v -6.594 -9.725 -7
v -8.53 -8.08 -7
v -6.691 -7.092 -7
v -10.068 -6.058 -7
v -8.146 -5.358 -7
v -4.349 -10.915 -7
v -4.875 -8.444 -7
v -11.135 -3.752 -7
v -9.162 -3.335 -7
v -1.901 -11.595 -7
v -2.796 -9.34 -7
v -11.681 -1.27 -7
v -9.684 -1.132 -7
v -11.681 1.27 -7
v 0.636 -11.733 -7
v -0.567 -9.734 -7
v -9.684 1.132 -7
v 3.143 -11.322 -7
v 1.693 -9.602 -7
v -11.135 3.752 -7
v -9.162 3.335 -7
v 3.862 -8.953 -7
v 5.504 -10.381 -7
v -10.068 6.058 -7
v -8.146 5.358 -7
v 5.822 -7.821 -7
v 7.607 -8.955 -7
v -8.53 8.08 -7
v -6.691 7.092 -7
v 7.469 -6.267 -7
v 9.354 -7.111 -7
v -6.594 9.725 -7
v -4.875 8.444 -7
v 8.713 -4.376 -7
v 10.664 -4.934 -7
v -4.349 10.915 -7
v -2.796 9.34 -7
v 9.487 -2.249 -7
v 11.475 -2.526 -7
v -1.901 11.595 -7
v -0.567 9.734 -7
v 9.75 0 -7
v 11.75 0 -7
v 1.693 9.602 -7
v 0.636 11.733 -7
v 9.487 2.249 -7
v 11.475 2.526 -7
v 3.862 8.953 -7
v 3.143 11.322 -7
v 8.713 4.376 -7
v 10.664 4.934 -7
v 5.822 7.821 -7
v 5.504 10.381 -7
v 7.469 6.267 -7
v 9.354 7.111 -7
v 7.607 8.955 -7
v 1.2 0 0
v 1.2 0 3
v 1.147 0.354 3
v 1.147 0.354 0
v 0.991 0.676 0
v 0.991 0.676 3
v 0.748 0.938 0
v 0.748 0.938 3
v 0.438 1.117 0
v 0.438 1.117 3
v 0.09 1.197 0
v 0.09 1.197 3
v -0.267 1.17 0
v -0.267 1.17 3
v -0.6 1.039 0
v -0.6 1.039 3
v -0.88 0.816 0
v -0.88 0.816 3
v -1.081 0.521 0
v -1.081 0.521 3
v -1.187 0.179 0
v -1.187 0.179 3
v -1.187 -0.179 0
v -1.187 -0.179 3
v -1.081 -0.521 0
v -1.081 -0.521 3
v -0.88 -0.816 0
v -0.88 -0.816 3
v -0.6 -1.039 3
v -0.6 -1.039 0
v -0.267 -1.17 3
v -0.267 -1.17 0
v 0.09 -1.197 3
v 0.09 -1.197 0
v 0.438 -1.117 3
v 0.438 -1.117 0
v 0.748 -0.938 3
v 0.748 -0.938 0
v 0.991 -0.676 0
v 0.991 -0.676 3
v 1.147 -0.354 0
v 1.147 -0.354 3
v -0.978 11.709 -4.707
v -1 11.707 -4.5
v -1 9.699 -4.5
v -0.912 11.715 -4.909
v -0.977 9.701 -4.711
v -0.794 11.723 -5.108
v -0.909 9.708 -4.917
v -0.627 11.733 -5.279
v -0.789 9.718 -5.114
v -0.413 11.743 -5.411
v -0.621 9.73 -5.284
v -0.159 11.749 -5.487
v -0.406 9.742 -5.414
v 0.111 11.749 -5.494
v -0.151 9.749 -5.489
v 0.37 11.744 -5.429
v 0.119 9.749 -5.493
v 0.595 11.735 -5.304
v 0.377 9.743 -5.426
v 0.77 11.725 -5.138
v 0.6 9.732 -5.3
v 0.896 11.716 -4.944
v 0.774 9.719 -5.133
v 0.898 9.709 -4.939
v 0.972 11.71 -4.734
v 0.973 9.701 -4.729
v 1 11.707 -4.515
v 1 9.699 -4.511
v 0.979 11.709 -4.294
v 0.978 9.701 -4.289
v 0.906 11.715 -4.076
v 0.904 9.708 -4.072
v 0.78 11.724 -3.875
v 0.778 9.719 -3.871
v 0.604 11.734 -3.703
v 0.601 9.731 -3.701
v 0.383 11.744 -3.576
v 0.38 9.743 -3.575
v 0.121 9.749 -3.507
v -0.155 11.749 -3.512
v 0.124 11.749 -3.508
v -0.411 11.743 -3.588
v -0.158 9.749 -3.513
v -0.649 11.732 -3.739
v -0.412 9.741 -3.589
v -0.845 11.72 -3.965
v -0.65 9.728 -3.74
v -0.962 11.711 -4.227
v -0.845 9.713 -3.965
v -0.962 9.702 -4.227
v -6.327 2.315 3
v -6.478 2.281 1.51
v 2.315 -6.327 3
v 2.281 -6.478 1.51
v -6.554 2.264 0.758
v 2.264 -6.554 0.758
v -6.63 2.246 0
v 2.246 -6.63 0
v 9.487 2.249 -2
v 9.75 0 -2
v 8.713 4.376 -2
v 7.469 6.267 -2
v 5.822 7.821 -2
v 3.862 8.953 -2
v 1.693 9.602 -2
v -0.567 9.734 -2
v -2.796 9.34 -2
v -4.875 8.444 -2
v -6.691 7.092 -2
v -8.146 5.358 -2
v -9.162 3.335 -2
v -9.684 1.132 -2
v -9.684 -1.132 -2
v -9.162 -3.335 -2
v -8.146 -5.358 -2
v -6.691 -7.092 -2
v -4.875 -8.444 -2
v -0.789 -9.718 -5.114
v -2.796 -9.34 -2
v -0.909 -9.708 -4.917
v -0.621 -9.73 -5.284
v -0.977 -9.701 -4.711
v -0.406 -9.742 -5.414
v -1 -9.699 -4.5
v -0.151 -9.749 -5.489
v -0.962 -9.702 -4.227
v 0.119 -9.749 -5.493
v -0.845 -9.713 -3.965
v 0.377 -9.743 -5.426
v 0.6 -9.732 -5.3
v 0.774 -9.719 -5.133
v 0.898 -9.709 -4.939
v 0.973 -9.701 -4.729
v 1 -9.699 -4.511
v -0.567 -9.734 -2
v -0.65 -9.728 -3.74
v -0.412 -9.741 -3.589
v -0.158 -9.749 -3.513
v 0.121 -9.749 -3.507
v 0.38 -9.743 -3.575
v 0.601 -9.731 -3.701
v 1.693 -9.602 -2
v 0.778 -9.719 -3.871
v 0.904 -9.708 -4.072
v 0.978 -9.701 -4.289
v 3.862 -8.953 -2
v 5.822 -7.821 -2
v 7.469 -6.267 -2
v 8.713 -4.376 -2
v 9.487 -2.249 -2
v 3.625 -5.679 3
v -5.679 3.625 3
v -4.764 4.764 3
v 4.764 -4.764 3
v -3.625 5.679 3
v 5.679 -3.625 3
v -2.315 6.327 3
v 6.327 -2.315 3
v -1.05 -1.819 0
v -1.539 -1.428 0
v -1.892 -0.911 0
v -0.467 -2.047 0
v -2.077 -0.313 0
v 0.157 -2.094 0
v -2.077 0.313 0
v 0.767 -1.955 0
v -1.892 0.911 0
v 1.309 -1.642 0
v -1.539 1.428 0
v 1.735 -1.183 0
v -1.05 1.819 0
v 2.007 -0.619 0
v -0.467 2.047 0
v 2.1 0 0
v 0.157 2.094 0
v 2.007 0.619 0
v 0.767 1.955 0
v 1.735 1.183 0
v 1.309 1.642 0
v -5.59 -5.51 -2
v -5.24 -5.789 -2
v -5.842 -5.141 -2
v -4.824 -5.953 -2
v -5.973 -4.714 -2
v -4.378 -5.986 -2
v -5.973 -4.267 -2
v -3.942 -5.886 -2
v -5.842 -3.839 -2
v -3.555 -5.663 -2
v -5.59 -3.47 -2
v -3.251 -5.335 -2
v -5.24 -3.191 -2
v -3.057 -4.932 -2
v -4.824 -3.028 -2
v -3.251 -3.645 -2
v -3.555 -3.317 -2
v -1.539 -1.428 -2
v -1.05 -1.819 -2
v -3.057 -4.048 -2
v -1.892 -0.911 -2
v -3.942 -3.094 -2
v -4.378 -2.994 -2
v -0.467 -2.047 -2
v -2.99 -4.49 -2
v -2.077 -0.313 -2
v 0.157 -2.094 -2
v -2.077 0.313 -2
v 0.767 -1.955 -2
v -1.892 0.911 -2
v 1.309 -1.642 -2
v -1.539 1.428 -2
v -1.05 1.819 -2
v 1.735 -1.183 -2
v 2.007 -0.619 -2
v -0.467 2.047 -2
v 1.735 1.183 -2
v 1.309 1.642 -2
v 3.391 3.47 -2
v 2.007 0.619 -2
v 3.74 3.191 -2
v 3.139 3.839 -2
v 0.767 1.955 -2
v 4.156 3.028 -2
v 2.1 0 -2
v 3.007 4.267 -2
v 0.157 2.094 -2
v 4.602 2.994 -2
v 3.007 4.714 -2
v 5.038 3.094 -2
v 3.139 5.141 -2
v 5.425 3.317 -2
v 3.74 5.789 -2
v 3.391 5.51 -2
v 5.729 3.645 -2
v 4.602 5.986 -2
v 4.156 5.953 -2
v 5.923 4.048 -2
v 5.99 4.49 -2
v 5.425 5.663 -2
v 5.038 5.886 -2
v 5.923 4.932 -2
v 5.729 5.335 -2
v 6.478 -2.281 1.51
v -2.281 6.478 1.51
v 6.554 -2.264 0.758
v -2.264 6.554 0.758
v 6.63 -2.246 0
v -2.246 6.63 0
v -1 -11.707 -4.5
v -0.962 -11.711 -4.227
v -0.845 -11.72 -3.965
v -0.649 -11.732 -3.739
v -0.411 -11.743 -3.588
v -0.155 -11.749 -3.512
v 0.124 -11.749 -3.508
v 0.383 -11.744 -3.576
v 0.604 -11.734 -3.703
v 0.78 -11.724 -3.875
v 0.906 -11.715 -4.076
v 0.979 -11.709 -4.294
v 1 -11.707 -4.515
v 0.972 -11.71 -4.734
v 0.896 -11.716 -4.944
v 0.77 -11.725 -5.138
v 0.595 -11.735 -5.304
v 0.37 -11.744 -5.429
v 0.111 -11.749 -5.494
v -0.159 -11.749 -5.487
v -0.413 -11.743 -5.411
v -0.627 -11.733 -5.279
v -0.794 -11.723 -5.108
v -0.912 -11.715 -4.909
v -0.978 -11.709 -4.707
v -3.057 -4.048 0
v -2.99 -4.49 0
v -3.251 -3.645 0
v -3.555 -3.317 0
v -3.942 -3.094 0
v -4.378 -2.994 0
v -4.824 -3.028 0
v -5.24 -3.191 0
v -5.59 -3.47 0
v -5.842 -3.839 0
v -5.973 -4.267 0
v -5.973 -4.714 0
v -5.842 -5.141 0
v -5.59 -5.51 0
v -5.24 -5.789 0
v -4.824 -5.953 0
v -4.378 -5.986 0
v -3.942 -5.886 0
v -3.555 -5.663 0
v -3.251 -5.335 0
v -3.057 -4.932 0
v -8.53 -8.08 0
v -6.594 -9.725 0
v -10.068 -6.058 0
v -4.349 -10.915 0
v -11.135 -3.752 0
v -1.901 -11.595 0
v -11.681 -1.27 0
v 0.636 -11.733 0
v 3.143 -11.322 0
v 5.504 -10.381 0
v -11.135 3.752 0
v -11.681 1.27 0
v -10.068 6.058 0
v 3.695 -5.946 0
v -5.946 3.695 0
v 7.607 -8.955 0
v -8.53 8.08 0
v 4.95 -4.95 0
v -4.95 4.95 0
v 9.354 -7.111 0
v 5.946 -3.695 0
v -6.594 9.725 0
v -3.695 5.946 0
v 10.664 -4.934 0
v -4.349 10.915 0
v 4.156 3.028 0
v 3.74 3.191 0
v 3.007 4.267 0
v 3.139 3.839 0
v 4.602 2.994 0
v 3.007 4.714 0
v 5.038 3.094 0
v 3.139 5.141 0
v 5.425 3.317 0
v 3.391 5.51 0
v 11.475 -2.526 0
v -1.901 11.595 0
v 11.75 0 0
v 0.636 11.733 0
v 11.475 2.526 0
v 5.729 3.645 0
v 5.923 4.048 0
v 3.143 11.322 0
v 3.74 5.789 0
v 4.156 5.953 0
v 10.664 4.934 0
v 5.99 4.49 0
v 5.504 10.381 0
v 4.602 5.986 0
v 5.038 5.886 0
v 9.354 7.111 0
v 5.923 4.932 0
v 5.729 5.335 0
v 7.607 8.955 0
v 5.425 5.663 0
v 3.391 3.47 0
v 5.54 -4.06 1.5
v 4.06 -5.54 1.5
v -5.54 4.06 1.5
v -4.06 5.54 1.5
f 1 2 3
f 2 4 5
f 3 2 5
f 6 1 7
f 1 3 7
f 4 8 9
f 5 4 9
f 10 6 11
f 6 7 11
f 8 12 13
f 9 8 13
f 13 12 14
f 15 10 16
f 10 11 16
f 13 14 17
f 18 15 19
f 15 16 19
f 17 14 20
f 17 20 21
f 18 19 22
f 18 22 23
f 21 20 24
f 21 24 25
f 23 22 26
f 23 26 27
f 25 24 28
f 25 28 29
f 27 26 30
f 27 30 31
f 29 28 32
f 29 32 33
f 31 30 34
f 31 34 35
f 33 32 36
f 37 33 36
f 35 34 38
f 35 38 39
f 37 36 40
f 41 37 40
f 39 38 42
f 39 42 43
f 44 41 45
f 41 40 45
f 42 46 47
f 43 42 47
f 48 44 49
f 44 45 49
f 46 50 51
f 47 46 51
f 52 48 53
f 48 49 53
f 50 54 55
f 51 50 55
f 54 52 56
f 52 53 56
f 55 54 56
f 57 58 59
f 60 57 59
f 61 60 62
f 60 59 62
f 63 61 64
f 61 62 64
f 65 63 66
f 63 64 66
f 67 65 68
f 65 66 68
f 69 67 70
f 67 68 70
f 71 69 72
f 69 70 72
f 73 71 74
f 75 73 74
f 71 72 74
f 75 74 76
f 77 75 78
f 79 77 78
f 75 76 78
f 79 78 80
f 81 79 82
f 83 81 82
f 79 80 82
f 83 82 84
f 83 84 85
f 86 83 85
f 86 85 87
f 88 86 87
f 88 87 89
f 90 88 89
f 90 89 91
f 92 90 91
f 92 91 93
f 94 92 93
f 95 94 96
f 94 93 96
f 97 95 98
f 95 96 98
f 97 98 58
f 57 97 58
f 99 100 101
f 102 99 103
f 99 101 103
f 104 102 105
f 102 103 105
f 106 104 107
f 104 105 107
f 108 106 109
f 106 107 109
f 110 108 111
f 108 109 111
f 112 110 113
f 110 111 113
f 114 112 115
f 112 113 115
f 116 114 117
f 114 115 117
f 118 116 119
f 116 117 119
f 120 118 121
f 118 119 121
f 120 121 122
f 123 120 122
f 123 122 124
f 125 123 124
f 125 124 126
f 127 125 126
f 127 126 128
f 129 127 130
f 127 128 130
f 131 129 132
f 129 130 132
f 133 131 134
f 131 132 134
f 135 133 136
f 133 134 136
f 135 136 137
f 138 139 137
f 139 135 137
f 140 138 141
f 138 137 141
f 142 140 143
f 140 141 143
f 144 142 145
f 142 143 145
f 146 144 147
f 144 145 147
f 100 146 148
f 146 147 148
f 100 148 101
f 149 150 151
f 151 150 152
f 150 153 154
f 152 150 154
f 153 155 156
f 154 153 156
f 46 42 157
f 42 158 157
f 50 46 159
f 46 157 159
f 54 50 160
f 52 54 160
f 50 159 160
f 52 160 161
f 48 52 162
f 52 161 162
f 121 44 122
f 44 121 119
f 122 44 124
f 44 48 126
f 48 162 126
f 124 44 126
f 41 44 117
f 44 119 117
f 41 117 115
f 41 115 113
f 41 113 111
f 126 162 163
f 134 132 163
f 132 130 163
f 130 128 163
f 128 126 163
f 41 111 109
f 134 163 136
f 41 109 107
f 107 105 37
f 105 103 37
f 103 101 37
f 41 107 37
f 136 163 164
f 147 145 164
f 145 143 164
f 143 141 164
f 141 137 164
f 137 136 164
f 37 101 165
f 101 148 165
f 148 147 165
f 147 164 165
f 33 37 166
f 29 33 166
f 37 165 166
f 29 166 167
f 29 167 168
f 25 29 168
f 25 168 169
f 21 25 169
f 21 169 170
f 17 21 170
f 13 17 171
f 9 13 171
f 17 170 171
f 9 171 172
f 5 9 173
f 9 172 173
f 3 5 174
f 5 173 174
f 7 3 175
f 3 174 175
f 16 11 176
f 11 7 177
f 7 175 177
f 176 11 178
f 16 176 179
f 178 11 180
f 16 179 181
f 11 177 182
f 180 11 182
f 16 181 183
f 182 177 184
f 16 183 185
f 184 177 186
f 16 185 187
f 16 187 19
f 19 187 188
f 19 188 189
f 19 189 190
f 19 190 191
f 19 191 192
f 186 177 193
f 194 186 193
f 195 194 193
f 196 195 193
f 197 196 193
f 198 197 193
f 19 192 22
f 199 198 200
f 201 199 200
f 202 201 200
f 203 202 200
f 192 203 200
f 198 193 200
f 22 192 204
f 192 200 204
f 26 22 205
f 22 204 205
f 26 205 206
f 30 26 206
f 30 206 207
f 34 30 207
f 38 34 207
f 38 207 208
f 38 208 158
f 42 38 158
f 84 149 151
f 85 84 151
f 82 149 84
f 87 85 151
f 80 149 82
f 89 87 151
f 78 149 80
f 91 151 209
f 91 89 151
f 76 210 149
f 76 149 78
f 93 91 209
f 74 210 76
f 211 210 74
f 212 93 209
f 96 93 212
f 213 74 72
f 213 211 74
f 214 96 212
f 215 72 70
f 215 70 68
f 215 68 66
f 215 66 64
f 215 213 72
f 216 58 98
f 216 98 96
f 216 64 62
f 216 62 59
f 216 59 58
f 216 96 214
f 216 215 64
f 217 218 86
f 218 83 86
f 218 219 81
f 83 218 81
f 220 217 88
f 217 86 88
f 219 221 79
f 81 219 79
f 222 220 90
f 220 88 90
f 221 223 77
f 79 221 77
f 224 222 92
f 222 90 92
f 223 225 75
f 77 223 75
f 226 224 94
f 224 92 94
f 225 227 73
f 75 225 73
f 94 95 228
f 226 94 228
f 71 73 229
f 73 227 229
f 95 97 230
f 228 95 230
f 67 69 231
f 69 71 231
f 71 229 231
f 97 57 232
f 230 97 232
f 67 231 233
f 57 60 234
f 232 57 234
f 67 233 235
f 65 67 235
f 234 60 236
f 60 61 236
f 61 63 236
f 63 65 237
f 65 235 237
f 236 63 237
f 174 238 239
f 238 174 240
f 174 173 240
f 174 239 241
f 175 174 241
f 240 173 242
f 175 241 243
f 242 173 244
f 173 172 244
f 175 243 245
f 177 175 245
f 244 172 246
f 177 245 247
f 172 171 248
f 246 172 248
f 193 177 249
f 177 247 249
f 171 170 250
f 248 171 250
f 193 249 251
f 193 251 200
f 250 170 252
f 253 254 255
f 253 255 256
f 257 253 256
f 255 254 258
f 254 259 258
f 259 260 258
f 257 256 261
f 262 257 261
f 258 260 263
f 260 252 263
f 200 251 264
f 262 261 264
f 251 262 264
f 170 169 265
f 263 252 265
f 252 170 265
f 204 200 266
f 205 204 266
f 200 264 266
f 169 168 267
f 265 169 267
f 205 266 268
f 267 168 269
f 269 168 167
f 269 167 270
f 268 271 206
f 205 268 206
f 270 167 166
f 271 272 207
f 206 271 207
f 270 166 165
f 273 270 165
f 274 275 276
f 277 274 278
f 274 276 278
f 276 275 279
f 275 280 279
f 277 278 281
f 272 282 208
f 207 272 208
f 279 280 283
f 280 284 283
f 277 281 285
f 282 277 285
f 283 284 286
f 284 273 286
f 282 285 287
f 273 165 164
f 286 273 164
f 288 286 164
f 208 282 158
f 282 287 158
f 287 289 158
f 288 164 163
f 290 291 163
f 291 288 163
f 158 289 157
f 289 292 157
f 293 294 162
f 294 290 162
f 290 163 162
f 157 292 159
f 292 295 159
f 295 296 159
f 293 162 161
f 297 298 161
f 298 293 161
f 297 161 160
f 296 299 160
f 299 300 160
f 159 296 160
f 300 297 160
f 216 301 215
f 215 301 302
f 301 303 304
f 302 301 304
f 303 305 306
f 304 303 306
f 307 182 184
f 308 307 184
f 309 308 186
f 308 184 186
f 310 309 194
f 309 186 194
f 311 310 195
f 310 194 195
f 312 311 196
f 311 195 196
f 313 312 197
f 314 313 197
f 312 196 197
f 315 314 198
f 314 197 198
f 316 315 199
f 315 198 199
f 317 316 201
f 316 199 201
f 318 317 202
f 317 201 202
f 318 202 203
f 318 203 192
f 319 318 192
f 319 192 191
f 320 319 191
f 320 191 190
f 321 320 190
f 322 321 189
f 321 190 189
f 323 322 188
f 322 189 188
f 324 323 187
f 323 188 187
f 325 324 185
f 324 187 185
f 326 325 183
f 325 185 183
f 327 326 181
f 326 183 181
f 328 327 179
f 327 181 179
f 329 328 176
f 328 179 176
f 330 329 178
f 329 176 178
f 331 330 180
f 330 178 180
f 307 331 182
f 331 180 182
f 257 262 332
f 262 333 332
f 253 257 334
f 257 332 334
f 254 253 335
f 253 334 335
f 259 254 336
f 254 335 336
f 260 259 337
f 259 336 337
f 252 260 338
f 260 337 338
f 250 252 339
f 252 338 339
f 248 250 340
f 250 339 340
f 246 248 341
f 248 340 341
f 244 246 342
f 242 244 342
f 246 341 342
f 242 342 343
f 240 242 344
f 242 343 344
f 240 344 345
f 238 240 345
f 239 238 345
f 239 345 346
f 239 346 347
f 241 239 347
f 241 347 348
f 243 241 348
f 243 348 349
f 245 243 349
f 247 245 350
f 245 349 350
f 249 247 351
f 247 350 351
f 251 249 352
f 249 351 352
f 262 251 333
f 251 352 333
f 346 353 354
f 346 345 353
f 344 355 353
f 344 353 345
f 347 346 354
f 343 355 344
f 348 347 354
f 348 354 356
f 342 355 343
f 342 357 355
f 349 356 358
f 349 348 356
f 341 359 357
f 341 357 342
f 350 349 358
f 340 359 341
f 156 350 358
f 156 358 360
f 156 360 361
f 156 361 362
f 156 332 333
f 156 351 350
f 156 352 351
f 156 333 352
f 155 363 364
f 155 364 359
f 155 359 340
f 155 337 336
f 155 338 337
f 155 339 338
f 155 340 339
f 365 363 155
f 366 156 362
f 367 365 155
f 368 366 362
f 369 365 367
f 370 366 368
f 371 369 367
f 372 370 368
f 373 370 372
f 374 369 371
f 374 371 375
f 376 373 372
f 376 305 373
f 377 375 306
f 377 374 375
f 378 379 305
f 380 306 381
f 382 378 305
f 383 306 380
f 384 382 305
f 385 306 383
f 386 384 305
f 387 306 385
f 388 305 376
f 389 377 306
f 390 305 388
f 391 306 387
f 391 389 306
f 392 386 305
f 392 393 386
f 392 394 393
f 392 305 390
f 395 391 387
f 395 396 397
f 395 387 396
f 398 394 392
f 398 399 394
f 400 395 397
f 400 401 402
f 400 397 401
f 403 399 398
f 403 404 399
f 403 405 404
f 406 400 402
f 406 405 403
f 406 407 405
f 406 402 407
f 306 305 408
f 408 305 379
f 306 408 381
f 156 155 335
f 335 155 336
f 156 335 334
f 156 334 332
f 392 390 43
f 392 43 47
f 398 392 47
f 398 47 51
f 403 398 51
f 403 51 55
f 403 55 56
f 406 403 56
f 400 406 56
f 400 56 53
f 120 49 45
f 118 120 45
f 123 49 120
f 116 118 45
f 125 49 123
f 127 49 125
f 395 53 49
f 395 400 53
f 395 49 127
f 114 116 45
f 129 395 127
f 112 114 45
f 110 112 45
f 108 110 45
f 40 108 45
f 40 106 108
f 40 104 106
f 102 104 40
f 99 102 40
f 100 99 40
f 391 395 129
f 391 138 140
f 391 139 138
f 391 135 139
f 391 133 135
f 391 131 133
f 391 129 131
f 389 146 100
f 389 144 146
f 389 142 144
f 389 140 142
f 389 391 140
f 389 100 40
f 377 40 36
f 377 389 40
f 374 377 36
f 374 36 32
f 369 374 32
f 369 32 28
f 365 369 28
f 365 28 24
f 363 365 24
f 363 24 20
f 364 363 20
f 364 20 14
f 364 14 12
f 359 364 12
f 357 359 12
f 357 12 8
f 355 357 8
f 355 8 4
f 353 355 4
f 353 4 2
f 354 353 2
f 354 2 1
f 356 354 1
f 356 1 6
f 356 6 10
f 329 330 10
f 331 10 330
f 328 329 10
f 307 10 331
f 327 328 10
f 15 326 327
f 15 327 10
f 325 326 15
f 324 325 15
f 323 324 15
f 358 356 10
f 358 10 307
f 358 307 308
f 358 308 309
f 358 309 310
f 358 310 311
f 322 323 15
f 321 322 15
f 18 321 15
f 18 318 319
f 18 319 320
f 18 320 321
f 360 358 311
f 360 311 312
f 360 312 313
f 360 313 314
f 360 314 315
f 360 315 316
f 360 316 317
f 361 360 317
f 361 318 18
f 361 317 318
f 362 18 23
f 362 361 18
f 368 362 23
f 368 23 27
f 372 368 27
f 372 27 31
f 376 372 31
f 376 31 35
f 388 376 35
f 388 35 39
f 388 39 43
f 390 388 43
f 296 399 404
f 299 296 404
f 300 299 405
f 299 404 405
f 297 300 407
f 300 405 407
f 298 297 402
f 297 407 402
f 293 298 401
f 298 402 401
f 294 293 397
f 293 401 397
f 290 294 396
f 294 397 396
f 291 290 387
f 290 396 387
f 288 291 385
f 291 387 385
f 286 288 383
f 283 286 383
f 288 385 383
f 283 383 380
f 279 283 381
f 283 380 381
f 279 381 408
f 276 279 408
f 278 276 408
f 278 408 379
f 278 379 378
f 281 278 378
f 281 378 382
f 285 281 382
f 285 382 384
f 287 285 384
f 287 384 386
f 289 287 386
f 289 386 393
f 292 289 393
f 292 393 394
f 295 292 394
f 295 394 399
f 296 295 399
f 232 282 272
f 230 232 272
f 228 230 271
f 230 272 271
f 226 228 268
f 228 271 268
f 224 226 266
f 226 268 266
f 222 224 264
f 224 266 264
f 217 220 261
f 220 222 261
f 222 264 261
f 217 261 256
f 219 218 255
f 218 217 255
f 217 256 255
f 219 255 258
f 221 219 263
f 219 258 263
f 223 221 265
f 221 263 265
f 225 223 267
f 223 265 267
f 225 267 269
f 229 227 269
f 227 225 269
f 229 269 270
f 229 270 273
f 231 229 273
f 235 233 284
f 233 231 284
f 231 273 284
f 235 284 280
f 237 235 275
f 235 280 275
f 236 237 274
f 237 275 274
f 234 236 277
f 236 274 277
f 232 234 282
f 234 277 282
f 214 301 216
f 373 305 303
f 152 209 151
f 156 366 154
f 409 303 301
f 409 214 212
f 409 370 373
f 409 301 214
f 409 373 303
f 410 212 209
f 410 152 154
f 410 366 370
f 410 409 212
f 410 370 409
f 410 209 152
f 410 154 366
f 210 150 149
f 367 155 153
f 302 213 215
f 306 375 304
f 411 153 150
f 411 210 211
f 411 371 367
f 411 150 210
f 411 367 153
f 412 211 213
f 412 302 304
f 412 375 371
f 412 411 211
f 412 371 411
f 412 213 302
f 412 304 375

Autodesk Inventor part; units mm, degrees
ref_plane "YZ Plane" through (0, 0, 0) normal (1, 0, 0) x (0, 1, 0)
ref_plane "XZ Plane" through (0, 0, 0) normal (0, 1, 0) x (-1, 0, 0)
ref_plane "XY Plane" through (0, 0, 0) normal (0, 0, 1) x (1, 0, 0)
sketch "Skizze1" plane through (0, 0, 0) normal (0, 0, 1) x (1, 0, 0)
  circle A0 centre (0, 0) radius 9.75
  line L0 (0, 16.45) -> (0, -16.45) construction
  line L1 (-16.45, 0) -> (16.45, 0) construction
  circle A1 centre (4.490128, 4.490128) radius 1.5
  circle A2 centre (0, 0) radius 6.35 construction
  circle A3 centre (-4.490128, -4.490128) radius 1.5
  circle A4 centre (0, 0) radius 11.75
  line L2 (4.490128, 4.490128) -> (0, 0) construction
  circle A5 centre (0, 0) radius 2.1
  circle A6 centre (0, 0) radius 1.2
  arc A7 (2.245874, -6.629936) -> (6.629936, -2.245874) centre (0, 0) ccw
  line L3 (6.629936, -2.245874) -> (-2.245874, 6.629936)
  line L4 (-6.629936, 2.245874) -> (2.245874, -6.629936)
  arc A8 (-2.245874, 6.629936) -> (-6.629936, 2.245874) centre (0, 0) ccw
  arc A9 (-2.245874, 6.629936) -> (-6.629936, 2.245874) centre (0, 0) ccw
  line L5 (0, 0) -> (4.949747, -4.949747) construction
  point P0 (0, -7)
  dimension "d3" = 6.35
  dimension "d0" = 19.5
  dimension "d1" = 3
  dimension "d6" = 360
  dimension "d8" = 2
  dimension "d17" = 45
  dimension "d21" = 4.2
  dimension "d24" = 2.4
  dimension "d76" = 7
  dimension "d122" = 6.2
extrude "Extrusion1" add sketch "Skizze1" against normal blind 7 contours A4
extrude "Extrusion2" add sketch "Skizze1" against normal blind 2 contours A0 | A4 | A5 | A6 | L4 A8 L3 A7
sketch "Skizze2" plane through (0, 0, 0) normal (0, 1, 0) x (-1, 0, 0)
  circle A0 centre (0, -4.5) radius 1
  line L0 (-9.75, 0) -> (9.75, 0) projected
  point P0 (0, 0)
  dimension "d13" = 2
  dimension "d14" = 4.5
extrude "Extrusion3" cut sketch "Skizze2" along normal through all both and the other way through all
sketch "Skizze1 outline for Extrusion4" plane through (0, 0, 0) normal (0, 0, 1) x (1, 0, 0)
  arc A0 (2.245874, -6.629936) -> (6.629936, -2.245874) centre (0, 0) ccw
  line L0 (-6.629936, 2.245874) -> (2.245874, -6.629936)
  arc A1 (-2.245874, 6.629936) -> (-6.629936, 2.245874) centre (0, 0) ccw
  line L1 (6.629936, -2.245874) -> (-2.245874, 6.629936)
extrude "Extrusion4" add sketch "Skizze1 outline for Extrusion4" along normal blind 3 draft -5
extrude "Extrusion6" cut sketch "Skizze1" along normal through all both and the other way through all contours A6
extrude "Extrusion7" cut sketch "Skizze1" along normal blind 2 from surface at -2 contours A5
properties part number "InputMountingHub"
